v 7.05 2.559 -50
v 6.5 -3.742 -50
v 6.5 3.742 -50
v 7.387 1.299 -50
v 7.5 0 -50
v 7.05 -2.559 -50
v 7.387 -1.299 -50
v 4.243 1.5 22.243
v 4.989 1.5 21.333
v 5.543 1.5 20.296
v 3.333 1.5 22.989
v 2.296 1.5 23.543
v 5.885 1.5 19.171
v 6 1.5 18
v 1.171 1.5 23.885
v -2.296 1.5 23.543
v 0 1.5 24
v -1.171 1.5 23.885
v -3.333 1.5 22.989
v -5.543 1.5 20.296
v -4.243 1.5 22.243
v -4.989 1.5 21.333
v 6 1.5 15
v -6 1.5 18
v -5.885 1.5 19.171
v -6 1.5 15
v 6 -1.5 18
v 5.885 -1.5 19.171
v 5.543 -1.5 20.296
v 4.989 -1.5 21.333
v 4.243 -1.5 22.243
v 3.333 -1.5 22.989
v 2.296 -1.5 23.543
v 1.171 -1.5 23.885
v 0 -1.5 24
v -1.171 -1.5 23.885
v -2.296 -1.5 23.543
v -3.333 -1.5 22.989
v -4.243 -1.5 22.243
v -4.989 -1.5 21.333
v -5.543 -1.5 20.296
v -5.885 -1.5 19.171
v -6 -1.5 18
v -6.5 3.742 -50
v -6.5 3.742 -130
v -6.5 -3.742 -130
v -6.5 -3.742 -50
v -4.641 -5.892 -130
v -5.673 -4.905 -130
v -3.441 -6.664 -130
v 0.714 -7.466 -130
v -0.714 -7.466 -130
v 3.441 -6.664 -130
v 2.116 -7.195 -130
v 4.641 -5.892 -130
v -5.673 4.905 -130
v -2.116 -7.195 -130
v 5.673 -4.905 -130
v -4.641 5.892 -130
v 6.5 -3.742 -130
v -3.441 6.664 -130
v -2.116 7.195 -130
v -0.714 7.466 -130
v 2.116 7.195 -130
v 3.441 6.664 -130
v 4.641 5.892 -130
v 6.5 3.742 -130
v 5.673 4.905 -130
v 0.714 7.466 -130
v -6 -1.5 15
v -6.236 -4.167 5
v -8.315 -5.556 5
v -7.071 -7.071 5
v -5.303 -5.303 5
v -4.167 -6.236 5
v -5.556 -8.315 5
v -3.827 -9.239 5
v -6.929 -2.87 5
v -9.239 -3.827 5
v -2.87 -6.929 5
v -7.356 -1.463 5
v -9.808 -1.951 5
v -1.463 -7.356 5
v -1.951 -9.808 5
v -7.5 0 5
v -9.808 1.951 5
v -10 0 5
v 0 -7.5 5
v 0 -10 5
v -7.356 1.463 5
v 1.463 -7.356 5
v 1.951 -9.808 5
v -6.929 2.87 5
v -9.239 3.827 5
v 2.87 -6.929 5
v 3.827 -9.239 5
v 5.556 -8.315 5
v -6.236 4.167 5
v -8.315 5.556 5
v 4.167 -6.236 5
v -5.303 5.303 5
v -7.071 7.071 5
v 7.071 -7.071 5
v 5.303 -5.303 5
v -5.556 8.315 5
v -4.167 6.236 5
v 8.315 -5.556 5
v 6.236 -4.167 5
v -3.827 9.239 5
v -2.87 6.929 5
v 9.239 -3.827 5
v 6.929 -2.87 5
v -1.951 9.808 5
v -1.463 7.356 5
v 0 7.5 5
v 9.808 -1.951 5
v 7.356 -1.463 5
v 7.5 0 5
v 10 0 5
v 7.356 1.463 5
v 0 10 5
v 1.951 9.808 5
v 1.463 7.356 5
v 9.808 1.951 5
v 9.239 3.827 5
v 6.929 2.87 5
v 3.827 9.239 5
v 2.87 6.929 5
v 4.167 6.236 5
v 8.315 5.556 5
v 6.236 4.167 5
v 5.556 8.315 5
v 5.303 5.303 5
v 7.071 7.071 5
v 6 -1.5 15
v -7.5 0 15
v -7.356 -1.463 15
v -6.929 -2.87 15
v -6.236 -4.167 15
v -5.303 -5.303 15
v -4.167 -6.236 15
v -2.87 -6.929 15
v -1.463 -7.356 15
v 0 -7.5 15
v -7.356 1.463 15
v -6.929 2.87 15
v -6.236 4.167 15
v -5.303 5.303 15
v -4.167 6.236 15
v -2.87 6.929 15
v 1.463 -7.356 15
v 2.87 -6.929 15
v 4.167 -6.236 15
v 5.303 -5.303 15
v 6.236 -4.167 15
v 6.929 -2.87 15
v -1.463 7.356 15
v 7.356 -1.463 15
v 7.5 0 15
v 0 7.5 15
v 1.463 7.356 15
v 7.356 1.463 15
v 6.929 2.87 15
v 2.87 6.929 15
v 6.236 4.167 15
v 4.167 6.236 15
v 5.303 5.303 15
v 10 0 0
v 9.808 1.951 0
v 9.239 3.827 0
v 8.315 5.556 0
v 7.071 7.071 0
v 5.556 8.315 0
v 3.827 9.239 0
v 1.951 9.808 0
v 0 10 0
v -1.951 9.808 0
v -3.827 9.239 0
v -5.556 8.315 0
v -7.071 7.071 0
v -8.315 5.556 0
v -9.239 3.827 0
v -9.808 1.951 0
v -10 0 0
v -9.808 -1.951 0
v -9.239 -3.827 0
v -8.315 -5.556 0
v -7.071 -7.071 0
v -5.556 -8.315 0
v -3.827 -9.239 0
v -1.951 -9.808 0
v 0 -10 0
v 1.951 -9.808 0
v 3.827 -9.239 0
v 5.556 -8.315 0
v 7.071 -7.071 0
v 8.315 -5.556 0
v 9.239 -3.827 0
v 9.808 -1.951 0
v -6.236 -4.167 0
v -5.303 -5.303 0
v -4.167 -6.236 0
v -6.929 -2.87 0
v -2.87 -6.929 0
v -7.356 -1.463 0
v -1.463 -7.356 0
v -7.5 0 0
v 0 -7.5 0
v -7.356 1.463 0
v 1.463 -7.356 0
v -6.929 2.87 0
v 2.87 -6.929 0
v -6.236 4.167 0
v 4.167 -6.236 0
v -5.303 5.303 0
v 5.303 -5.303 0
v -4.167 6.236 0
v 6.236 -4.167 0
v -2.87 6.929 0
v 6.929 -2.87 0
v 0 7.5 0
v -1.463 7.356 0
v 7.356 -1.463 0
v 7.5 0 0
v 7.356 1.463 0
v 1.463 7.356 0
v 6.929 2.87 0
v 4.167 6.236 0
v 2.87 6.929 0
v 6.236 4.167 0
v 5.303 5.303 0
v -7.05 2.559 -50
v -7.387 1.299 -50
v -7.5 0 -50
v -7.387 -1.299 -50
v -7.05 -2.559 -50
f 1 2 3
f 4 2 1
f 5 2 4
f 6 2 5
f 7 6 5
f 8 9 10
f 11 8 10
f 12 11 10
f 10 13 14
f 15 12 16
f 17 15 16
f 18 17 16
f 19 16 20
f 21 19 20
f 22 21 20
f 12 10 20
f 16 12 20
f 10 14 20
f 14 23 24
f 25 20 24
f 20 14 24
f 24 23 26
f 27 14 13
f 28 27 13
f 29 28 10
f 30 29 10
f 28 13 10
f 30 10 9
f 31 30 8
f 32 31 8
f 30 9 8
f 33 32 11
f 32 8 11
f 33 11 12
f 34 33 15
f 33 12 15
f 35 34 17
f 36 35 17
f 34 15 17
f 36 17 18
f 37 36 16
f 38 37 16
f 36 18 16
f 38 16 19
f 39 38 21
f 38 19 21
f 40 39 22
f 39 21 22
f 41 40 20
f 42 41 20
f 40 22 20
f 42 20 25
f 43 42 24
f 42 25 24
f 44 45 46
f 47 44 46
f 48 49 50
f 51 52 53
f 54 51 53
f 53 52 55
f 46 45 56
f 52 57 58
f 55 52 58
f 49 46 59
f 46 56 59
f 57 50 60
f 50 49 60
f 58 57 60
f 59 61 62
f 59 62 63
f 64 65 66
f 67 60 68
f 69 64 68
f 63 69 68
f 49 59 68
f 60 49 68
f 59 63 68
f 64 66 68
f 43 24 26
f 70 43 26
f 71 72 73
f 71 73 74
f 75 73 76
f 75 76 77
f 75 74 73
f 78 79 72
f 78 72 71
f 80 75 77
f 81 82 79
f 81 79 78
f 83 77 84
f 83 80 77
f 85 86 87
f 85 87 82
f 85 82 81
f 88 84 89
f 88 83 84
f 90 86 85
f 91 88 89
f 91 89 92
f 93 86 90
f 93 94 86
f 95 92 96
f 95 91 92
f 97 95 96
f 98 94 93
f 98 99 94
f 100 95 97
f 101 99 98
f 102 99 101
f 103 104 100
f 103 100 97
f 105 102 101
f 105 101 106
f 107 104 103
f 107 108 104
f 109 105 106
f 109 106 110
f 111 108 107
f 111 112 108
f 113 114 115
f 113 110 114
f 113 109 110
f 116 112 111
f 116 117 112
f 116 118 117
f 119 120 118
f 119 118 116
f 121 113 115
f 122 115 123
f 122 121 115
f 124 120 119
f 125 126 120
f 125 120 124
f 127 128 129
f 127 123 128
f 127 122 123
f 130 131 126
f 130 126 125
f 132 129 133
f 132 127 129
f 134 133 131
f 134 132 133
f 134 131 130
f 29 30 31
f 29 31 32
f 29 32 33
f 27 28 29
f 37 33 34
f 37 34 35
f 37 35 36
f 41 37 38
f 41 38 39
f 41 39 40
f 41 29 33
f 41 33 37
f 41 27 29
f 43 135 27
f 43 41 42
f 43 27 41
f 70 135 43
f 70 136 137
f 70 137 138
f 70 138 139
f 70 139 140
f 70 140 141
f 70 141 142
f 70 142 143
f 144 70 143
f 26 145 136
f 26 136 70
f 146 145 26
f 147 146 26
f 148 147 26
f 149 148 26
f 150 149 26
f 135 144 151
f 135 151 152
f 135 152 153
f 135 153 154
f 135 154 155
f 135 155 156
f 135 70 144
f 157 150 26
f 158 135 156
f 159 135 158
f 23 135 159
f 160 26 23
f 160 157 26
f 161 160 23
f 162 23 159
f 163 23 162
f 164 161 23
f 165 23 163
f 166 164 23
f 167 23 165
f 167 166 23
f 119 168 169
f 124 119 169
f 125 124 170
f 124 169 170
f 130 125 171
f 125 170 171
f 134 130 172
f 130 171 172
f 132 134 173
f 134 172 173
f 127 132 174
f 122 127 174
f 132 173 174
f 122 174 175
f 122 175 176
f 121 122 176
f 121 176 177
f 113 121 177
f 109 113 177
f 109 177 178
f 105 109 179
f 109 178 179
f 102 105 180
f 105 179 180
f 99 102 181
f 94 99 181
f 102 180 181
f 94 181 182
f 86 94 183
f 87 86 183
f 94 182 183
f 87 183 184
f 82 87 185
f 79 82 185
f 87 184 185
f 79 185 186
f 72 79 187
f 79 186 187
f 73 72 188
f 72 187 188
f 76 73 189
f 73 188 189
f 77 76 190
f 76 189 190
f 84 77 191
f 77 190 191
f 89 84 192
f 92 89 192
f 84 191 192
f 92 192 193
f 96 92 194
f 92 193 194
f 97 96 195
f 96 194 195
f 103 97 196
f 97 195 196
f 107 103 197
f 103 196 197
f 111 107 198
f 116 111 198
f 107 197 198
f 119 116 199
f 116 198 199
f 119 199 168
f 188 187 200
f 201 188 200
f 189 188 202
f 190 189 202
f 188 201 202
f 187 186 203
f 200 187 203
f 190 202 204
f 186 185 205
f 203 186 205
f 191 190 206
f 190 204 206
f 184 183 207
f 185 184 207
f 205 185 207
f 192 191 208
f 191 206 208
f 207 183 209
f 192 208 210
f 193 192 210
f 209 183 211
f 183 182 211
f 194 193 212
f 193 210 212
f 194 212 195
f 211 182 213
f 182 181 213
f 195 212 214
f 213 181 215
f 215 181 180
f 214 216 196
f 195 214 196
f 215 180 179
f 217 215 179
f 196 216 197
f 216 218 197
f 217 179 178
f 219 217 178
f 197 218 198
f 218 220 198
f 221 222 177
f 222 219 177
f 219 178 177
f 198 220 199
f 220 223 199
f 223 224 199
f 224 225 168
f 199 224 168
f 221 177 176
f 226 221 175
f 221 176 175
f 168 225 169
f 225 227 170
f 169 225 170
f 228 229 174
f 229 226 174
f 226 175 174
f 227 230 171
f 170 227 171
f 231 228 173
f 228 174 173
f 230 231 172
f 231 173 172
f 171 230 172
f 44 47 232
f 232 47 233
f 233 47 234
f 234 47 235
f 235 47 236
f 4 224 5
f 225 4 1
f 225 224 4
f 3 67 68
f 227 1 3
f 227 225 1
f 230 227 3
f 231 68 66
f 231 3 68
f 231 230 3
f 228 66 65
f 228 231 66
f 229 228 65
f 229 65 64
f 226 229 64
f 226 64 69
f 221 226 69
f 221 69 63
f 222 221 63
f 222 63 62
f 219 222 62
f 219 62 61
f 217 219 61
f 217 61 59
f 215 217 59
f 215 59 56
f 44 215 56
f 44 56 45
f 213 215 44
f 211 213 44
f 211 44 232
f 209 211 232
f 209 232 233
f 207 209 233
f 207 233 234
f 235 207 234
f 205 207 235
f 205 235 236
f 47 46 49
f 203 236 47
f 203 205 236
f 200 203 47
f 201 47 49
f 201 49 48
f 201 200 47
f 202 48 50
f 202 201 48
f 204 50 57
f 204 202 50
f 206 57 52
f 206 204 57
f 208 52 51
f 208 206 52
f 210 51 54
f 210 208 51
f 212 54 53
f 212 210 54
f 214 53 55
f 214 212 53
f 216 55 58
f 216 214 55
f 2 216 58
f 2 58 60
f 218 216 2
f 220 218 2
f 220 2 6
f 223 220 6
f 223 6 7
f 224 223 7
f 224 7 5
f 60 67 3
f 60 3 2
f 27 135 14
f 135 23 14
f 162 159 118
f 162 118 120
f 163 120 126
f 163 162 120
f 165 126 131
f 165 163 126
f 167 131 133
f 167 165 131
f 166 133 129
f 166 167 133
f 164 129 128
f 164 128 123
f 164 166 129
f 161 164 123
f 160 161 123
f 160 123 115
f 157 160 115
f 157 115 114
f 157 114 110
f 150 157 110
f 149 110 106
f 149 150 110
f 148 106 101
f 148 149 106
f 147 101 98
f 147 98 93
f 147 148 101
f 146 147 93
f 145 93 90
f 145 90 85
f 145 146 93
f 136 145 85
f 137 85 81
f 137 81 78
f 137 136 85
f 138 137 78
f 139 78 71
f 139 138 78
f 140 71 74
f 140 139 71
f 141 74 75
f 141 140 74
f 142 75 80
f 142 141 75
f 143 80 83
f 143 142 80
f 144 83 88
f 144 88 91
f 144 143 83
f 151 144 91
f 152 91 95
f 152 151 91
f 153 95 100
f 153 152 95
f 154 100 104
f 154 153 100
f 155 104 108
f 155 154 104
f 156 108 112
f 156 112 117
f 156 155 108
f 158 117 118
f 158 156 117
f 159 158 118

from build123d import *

# Parameters (mm, degrees)
SKETCH1_R           = 7.5
BOSS_EXTRUDE1_DEPTH = 130
SKETCH2_R           = 10
BOSS_EXTRUDE2_DEPTH = 5
BOSS_EXTRUDE3_START = 10
SKETCH3_R           = 7.5
BOSS_EXTRUDE3_DEPTH = 10
CUT_EXTRUDE1_START  = -80
CUT_EXTRUDE1_DEPTH  = 80
BOSS_EXTRUDE4_DEPTH = 1.5


with BuildPart() as part:
    # Sketch1 → Boss-Extrude1 (new body)
    with BuildSketch(Plane.XY):
        Circle(SKETCH1_R)
    extrude(amount=-BOSS_EXTRUDE1_DEPTH)

    # Sketch2 → Boss-Extrude2 (add)
    with BuildSketch(Plane.XY):
        Circle(SKETCH2_R)
    extrude(amount=BOSS_EXTRUDE2_DEPTH)

    # Sketch3 → Boss-Extrude3 (add)
    with BuildSketch(Plane.XY.offset(5).offset(BOSS_EXTRUDE3_START)):
        Circle(SKETCH3_R)
    extrude(amount=-BOSS_EXTRUDE3_DEPTH)

    # Sketch4 → Cut-Extrude1 (cut)
    with BuildSketch(Plane(origin=(0, 0, -130), x_dir=(-1, 0, 0), z_dir=(0, 0, -1)).offset(CUT_EXTRUDE1_START)):
        with BuildLine():
            Line((-6.5, 3.741657387), (-6.5, -3.741657387))
            ThreePointArc((-6.5, -3.741657387), (-7.5, 0), (-6.5, 3.741657387))
        make_face()
        with BuildLine():
            Line((6.5, 3.741657387), (6.5, -3.741657387))
            ThreePointArc((6.5, -3.741657387), (7.5, 0), (6.5, 3.741657387))
        make_face()
    extrude(amount=CUT_EXTRUDE1_DEPTH, mode=Mode.SUBTRACT)

    # Sketch6 → Boss-Extrude4 (add, symmetric)
    with BuildSketch(Plane(origin=(0, 0, 0), x_dir=(1, 0, 0), z_dir=(0, 1, 0))):
        with BuildLine():
            Line((-6, -18), (-6, -15))
            Line((-6, -15), (6, -15))
            Line((6, -15), (6, -18))
            ThreePointArc((6, -18), (0, -24), (-6, -18))
        make_face()
    extrude(amount=BOSS_EXTRUDE4_DEPTH, both=True)


solid = part.part
